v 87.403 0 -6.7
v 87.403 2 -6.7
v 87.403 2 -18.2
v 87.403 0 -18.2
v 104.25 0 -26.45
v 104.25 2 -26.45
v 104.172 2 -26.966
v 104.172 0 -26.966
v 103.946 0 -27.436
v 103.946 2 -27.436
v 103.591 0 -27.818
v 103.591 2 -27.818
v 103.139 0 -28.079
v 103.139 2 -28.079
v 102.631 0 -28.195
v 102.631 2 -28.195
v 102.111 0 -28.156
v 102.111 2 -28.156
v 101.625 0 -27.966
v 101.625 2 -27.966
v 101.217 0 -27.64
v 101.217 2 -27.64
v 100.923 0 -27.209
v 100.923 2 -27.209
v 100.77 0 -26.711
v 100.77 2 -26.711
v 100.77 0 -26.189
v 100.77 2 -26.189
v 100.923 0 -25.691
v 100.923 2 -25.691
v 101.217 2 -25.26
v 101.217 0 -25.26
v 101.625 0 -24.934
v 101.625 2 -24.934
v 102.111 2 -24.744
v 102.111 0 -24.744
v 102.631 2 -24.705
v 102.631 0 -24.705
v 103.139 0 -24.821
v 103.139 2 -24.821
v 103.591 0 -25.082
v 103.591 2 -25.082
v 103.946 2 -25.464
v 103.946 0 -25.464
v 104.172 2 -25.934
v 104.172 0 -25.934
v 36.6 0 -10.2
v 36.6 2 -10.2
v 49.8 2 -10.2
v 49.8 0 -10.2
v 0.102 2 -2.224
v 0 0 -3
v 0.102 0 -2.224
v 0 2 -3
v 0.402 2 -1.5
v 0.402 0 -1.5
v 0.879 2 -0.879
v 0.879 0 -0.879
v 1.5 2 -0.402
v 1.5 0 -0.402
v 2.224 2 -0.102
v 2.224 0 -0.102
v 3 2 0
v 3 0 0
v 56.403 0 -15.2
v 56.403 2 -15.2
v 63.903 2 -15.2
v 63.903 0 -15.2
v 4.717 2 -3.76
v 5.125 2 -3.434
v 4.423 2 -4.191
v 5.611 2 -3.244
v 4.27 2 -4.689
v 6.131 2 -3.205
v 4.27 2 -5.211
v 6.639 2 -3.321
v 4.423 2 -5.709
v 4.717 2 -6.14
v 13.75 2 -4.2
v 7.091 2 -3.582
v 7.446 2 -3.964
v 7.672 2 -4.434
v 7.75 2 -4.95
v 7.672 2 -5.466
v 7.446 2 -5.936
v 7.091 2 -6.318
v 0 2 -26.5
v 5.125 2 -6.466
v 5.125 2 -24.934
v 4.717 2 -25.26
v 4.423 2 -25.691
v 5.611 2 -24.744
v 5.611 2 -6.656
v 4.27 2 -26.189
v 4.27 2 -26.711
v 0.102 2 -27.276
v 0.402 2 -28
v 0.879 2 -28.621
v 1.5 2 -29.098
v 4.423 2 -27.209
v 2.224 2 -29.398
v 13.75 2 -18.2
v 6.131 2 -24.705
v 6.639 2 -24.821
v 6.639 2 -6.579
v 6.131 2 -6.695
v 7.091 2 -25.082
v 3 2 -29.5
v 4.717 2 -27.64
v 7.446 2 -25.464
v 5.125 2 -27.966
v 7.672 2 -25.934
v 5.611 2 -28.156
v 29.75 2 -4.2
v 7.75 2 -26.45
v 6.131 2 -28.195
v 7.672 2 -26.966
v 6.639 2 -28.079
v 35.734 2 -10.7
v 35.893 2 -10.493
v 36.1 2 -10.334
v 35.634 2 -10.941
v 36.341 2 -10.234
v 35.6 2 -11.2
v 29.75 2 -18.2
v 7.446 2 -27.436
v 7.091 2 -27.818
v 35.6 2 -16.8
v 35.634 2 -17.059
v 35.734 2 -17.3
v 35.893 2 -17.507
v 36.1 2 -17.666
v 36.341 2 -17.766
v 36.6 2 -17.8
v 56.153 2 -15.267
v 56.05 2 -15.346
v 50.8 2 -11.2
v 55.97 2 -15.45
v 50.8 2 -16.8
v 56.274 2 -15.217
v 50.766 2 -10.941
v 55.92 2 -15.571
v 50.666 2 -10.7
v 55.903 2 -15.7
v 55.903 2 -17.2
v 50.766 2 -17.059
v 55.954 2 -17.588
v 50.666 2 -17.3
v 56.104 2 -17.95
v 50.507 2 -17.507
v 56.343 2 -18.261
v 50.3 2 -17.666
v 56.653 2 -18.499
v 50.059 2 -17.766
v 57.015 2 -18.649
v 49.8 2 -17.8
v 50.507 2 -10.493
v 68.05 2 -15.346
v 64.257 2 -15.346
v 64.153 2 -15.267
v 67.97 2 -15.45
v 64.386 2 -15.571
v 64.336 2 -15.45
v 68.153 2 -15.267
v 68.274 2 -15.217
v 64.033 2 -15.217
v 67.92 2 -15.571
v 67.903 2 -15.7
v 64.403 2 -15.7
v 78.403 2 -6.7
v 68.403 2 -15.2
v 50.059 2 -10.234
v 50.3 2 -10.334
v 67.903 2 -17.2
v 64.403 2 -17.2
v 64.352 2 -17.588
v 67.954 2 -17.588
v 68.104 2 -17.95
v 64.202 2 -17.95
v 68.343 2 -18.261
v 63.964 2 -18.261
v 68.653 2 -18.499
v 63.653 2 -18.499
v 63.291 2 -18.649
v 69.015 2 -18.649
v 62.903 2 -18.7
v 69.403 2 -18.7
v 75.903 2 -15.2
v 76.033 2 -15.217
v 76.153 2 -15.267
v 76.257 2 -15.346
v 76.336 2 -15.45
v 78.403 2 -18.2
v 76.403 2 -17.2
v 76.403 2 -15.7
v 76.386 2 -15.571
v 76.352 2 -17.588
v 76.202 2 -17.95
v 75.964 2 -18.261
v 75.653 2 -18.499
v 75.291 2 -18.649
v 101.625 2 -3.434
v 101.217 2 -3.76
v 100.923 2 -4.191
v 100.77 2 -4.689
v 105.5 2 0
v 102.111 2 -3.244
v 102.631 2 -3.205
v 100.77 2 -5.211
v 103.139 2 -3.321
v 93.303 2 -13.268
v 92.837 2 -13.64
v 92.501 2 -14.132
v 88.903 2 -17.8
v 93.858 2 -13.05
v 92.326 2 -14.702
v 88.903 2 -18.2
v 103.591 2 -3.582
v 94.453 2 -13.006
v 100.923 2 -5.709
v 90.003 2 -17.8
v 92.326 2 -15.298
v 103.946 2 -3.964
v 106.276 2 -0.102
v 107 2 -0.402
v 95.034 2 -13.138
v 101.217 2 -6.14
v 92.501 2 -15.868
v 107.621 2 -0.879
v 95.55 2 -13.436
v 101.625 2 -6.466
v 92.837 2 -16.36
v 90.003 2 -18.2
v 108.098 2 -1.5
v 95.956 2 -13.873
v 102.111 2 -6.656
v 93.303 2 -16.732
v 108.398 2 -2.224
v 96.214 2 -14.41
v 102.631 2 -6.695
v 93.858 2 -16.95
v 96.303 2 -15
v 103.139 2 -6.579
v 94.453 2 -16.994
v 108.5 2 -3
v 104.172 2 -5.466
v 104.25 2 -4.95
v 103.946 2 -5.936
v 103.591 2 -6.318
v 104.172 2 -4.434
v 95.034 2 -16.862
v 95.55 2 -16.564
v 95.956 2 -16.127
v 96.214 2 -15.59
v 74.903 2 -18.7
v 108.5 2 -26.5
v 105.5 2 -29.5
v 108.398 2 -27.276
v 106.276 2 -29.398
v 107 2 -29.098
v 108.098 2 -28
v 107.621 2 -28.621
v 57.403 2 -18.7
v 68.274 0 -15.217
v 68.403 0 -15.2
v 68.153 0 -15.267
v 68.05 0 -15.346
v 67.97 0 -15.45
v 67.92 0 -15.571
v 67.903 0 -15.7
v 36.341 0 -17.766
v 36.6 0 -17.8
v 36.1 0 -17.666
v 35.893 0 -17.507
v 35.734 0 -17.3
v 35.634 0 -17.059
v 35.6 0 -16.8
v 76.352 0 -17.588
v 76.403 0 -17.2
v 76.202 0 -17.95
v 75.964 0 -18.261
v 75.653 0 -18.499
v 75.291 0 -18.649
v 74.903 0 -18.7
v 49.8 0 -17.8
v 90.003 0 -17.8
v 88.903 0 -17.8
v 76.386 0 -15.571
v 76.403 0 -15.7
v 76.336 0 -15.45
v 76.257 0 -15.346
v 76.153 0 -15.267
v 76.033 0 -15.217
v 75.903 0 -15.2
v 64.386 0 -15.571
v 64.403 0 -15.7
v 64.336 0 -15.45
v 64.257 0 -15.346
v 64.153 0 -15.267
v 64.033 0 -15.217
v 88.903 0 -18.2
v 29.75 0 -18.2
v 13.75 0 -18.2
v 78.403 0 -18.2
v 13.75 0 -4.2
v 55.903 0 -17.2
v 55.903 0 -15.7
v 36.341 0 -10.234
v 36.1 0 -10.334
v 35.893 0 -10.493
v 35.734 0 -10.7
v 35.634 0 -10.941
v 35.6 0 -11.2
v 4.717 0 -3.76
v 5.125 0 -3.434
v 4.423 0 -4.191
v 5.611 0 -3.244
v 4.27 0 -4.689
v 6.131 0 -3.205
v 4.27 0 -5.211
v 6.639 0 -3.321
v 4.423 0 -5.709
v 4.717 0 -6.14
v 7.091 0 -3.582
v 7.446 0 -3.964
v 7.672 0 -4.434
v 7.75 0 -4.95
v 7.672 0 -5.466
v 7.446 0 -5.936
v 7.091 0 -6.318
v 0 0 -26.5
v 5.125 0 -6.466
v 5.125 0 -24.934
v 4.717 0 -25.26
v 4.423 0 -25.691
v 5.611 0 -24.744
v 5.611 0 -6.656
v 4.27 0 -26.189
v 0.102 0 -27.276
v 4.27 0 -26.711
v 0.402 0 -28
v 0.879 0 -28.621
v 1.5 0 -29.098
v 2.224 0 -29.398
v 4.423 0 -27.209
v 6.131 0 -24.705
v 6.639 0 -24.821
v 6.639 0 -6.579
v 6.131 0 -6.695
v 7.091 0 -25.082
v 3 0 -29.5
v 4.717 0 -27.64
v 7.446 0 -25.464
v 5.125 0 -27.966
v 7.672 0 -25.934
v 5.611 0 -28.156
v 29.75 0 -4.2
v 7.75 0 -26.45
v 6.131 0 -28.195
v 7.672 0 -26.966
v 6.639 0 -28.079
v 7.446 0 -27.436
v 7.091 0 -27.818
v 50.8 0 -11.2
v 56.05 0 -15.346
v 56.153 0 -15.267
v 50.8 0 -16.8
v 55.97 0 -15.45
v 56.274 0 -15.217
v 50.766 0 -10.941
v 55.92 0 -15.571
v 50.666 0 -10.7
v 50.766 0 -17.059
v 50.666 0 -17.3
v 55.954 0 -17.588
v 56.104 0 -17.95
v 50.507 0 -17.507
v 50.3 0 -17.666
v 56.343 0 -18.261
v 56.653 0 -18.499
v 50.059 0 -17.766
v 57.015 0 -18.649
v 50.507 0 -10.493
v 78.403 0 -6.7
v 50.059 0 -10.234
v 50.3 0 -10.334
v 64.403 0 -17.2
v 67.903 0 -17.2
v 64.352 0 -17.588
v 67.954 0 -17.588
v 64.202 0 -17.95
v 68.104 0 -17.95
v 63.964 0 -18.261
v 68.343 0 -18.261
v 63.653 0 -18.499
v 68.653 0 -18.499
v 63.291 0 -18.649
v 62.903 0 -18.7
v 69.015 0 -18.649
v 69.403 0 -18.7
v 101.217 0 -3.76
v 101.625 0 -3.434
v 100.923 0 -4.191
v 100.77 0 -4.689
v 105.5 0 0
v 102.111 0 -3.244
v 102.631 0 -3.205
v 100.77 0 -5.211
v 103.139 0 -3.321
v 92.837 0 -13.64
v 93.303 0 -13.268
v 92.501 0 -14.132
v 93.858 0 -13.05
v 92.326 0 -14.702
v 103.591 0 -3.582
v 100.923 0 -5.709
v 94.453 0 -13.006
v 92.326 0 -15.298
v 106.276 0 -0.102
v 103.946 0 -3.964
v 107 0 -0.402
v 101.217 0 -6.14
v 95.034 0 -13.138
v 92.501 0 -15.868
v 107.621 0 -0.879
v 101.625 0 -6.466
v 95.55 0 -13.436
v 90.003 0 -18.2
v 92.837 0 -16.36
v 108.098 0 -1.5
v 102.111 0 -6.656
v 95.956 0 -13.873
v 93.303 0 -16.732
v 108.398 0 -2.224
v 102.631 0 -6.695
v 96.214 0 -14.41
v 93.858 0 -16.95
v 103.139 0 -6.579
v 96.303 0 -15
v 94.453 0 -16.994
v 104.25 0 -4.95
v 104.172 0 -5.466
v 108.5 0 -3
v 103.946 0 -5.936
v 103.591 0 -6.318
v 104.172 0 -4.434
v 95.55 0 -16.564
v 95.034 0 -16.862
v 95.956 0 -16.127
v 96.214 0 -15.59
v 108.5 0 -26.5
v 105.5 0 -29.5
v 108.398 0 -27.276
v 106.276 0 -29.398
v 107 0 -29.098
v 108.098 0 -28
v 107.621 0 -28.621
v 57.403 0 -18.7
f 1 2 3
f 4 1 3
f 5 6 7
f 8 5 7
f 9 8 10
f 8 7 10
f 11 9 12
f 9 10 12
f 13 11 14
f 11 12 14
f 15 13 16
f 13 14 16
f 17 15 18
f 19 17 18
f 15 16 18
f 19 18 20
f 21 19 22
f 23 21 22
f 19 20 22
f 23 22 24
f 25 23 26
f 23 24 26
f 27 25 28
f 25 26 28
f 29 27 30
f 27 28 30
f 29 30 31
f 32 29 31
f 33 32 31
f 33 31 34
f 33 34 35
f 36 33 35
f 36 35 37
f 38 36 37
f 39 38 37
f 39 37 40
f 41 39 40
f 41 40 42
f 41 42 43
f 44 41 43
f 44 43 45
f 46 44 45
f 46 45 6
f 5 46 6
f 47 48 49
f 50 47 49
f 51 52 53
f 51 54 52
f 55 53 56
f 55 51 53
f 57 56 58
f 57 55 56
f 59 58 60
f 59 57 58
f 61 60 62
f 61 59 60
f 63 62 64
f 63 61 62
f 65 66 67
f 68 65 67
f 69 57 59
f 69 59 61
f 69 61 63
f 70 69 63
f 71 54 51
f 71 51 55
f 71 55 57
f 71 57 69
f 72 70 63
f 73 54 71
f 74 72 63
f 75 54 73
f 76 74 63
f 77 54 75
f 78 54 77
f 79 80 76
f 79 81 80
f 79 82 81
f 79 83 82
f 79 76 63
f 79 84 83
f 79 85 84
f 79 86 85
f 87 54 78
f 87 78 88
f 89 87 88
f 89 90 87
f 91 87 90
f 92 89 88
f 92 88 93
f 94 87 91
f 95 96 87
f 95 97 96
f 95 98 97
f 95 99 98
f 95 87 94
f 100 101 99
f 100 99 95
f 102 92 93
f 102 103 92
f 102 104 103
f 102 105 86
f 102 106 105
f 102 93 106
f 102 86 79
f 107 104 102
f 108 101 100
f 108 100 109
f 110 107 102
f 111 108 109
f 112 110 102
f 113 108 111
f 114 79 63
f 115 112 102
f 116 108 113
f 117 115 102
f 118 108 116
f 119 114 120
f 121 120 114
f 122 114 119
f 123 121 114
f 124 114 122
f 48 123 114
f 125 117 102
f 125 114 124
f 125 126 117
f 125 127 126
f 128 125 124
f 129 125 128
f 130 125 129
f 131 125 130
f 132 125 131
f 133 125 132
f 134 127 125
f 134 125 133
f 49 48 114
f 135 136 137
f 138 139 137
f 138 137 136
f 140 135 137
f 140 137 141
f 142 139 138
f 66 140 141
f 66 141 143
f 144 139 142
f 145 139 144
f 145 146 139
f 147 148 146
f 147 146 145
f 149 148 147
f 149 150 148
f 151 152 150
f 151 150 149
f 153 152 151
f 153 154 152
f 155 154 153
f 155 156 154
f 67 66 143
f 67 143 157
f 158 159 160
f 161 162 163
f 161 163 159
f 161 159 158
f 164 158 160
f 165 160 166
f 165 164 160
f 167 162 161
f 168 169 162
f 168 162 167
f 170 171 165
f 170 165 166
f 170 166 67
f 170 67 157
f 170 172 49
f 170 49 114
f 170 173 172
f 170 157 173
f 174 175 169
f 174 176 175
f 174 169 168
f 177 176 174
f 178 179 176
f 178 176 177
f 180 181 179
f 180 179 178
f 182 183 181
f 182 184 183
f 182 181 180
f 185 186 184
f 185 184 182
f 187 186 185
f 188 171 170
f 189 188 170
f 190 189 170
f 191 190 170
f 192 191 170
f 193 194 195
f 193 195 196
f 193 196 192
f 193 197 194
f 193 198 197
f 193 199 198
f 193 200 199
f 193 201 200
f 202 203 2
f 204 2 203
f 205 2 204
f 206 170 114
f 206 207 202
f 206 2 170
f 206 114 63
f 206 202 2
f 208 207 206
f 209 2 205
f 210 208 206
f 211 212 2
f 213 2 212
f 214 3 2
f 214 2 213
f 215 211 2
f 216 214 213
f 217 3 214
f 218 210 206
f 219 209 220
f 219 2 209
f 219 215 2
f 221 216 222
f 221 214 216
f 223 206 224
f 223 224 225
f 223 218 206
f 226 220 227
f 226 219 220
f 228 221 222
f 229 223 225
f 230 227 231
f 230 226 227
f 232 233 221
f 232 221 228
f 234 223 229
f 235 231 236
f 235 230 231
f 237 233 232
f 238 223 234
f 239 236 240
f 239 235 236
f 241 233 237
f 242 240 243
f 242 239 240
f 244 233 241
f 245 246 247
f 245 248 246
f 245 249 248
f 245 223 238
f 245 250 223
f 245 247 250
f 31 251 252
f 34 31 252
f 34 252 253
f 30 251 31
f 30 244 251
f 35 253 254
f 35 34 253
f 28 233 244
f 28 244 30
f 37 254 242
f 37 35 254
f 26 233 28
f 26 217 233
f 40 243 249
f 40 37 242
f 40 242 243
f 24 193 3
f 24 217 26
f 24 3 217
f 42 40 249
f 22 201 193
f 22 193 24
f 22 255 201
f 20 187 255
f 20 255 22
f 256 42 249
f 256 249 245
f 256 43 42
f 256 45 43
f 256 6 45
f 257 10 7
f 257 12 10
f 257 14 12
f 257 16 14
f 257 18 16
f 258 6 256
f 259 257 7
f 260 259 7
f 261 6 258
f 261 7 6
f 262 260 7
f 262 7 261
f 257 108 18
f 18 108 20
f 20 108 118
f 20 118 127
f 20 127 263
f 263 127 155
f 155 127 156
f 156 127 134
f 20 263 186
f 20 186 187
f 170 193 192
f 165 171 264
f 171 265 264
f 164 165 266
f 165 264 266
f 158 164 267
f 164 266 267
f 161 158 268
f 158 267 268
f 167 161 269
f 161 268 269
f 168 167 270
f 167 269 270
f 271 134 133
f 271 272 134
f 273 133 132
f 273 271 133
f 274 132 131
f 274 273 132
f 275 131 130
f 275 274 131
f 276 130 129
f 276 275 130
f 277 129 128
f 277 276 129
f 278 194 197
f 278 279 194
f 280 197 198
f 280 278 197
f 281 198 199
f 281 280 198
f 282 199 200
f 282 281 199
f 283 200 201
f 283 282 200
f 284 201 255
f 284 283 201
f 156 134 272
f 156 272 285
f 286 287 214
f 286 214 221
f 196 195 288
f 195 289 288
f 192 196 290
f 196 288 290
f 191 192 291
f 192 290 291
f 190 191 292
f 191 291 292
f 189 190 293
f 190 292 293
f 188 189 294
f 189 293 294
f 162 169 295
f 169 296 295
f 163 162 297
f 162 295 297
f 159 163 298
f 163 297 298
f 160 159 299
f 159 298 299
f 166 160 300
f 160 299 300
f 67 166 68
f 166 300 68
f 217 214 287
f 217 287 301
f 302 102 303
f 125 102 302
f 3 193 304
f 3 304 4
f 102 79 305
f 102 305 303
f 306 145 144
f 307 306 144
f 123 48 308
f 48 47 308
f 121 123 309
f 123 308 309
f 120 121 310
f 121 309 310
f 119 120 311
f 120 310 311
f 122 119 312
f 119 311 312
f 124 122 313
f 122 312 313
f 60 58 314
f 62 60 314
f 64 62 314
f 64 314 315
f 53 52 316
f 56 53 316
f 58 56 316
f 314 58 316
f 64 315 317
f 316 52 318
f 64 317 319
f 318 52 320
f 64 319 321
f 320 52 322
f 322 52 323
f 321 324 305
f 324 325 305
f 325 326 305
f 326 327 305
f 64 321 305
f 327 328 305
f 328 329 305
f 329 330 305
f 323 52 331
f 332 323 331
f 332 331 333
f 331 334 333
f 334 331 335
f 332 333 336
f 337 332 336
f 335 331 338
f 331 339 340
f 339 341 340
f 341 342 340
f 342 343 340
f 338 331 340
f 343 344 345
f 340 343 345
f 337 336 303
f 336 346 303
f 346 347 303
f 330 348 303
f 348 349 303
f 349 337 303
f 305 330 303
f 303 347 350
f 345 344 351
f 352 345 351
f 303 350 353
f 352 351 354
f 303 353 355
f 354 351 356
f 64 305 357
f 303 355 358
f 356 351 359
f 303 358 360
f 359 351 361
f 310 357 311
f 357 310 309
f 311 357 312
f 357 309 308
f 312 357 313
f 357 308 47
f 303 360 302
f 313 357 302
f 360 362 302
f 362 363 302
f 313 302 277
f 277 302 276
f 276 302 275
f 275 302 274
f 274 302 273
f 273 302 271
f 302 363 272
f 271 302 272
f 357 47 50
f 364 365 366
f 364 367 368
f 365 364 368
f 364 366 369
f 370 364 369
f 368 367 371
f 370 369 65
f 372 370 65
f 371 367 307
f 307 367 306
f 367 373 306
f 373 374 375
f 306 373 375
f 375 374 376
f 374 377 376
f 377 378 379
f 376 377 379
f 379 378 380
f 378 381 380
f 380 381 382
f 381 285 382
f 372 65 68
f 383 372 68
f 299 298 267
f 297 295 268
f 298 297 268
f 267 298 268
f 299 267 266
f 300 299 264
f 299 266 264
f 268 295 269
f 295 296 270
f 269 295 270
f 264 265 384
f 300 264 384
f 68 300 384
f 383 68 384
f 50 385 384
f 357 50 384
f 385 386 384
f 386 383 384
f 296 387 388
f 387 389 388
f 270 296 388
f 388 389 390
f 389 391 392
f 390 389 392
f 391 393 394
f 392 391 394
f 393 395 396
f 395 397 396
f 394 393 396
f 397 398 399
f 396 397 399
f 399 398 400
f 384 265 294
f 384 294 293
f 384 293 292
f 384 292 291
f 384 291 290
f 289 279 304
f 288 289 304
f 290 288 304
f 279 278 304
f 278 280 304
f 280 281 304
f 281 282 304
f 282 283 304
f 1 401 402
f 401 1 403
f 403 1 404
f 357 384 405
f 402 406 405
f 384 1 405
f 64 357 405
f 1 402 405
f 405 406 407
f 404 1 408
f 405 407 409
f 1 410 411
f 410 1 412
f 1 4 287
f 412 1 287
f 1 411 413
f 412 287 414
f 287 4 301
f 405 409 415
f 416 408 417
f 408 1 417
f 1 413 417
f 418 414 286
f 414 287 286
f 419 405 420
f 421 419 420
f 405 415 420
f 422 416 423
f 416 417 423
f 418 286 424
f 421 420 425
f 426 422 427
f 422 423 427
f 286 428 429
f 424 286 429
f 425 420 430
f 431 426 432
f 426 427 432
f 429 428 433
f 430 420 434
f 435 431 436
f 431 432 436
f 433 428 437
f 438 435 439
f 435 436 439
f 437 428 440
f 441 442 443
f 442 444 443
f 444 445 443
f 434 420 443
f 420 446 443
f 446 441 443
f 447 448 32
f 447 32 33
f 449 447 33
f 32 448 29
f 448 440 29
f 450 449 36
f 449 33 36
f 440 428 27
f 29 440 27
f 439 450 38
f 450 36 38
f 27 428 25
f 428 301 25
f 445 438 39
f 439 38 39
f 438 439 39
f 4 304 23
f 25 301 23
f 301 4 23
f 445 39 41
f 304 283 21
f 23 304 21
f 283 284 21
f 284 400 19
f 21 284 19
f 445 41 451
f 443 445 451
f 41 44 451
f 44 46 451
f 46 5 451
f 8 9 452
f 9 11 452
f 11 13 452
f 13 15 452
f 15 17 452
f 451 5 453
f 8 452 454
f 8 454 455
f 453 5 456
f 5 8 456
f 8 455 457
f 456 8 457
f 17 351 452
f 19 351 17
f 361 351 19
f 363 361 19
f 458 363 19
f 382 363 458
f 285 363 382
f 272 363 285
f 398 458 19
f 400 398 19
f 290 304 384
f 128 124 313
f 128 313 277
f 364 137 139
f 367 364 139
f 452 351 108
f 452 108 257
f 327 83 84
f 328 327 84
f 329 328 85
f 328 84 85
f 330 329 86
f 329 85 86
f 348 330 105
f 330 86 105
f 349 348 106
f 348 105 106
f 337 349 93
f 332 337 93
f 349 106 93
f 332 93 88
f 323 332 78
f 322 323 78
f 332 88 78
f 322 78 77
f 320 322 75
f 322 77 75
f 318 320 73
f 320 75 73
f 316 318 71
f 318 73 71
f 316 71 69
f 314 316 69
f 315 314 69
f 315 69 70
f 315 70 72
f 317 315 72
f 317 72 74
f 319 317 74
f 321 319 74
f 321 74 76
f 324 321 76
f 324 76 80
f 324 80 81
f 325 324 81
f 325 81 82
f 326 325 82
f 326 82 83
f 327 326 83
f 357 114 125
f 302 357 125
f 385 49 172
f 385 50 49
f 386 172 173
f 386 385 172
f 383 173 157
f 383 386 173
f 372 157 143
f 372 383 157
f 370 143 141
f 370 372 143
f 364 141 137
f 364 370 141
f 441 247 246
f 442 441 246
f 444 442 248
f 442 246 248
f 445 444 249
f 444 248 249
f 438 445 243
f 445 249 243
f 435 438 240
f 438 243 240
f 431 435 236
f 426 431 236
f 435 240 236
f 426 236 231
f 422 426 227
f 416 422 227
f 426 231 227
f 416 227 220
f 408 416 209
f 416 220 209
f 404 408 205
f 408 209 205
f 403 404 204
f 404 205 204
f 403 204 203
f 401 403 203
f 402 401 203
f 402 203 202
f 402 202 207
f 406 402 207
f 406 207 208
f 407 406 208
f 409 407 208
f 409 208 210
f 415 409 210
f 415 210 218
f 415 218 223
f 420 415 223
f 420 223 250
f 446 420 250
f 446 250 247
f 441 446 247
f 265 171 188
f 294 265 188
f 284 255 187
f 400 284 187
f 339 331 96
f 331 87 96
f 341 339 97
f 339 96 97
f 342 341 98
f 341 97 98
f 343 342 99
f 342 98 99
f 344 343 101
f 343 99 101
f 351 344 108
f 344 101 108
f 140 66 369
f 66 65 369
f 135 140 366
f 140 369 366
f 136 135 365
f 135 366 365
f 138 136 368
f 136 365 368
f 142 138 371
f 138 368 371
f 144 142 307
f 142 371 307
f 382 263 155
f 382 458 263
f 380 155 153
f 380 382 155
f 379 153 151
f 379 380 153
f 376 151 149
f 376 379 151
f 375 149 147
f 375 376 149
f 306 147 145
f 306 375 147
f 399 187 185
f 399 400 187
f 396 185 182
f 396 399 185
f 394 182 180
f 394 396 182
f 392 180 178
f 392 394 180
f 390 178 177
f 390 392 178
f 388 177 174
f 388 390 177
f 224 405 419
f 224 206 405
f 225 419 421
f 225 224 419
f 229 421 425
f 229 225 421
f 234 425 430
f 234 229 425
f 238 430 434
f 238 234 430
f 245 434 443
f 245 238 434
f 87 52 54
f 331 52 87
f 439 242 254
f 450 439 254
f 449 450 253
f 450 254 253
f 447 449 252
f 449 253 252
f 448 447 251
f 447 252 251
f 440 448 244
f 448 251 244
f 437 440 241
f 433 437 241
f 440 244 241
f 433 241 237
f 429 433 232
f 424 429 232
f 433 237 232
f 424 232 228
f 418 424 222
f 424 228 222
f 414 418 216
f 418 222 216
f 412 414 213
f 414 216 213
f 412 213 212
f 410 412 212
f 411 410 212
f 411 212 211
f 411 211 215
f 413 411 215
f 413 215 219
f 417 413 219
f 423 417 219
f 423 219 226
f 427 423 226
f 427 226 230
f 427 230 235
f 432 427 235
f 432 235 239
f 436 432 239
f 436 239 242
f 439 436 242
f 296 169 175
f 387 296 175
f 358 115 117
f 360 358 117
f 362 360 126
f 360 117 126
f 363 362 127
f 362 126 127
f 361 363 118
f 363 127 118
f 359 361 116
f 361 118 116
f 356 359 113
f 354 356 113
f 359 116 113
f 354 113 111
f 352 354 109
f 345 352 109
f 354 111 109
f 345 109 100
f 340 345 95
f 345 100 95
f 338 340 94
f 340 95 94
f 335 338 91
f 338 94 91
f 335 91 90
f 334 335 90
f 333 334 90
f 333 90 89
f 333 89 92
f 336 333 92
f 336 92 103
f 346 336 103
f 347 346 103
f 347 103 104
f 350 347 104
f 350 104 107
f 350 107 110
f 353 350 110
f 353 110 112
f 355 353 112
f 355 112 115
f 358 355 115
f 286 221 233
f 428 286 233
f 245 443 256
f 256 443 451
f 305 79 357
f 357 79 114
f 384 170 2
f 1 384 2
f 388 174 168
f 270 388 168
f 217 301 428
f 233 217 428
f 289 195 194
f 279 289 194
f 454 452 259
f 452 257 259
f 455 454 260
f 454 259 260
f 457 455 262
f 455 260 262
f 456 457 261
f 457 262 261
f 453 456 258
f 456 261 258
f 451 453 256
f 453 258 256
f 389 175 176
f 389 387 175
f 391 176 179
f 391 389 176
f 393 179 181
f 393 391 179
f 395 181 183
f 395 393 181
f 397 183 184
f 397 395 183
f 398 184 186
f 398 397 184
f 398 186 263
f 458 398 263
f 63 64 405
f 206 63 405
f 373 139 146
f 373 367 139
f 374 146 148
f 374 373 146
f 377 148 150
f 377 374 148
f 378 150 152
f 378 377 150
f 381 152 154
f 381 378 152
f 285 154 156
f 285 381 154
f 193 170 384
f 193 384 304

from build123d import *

# Parameters (mm, degrees)
SKETCH1_W           = 108.5
SKETCH1_H           = 29.5
BOSS_EXTRUDE1_DEPTH = 2
SKETCH2_R           = 1.75
CUT_EXTRUDE1_DEPTH  = 3
FILLET1_R           = 3
SKETCH5_R           = 2
SKETCH5_W           = 16
SKETCH5_H           = 14
SKETCH5_W_2         = 15.2
SKETCH5_H_2         = 7.6
SKETCH5_W_3         = 1.1
SKETCH5_H_3         = 0.4
SKETCH5_W_4         = 9
SKETCH5_H_4         = 11.5
CUT_EXTRUDE2_DEPTH  = 3
FILLET2_R           = 1
FILLET3_R           = 1.5
FILLET4_R           = 0.5


with BuildPart() as part:
    # Sketch1 → Boss-Extrude1 (new body)
    with BuildSketch(Plane(origin=(0, 0, 0), x_dir=(1, 0, 0), z_dir=(0, 1, 0))):
        with Locations((54.25, 14.75)):
            Rectangle(SKETCH1_W, SKETCH1_H)
    extrude(amount=BOSS_EXTRUDE1_DEPTH)

    # Sketch2 → Cut-Extrude1 (cut, through all)
    with BuildSketch(Plane(origin=(0, 2, 0), x_dir=(1, 0, 0), z_dir=(0, 1, 0))):
        with Locations((6, 26.45)):
            Circle(SKETCH2_R)
        with Locations((6, 4.95)):
            Circle(SKETCH2_R)
        with Locations((102.5, 4.95)):
            Circle(SKETCH2_R)
        with Locations((102.5, 26.45)):
            Circle(SKETCH2_R)
    extrude(amount=-CUT_EXTRUDE1_DEPTH, mode=Mode.SUBTRACT)

    # Fillet1
    fillet1_edges = [part.edges().sort_by_distance(p)[0] for p in [
        (0, 1, -29.5),
        (108.5, 1, -29.5),
        (108.5, 1, 0),
        (0, 1, 0),
    ]]
    fillet(fillet1_edges, radius=FILLET1_R)

    # Sketch5 → Cut-Extrude2 (cut, through all)
    with BuildSketch(Plane(origin=(0, 2, 0), x_dir=(1, 0, 0), z_dir=(0, 1, 0))):
        with Locations((94.303253972, 15)):
            Circle(SKETCH5_R)
        with Locations((21.75, 11.2)):
            Rectangle(SKETCH5_W, SKETCH5_H)
        with Locations((43.2, 14)):
            Rectangle(SKETCH5_W_2, SKETCH5_H_2)
        Polygon((55.903253972, 18.2), (55.903253972, 15.2), (64.403253972, 15.2), (64.403253972, 18.2), (64.403253972, 18.7), (55.903253972, 18.7), align=None)
        with Locations((89.453253972, 18)):
            Rectangle(SKETCH5_W_3, SKETCH5_H_3)
        Polygon((67.903253972, 18.2), (67.903253972, 15.2), (76.403253972, 15.2), (76.403253972, 18.2), (76.403253972, 18.7), (67.903253972, 18.7), align=None)
        with Locations((82.903253972, 12.45)):
            Rectangle(SKETCH5_W_4, SKETCH5_H_4)
    extrude(amount=-CUT_EXTRUDE2_DEPTH, mode=Mode.SUBTRACT)

    # Fillet2
    fillet2_edges = [part.edges().sort_by_distance(p)[0] for p in [
        (50.8, 1, -10.2),
        (35.6, 1, -10.2),
        (35.6, 1, -17.8),
        (50.8, 1, -17.8),
    ]]
    fillet(fillet2_edges, radius=FILLET2_R)

    # Fillet3
    fillet3_edges = [part.edges().sort_by_distance(p)[0] for p in [
        (67.903253972, 1, -18.7),
        (76.403253972, 1, -18.7),
        (55.903253972, 1, -18.7),
        (64.403253972, 1, -18.7),
    ]]
    fillet(fillet3_edges, radius=FILLET3_R)

    # Fillet4
    fillet4_edges = [part.edges().sort_by_distance(p)[0] for p in [
        (76.403253972, 1, -15.2),
        (67.903253972, 1, -15.2),
        (64.403253972, 1, -15.2),
        (55.903253972, 1, -15.2),
    ]]
    fillet(fillet4_edges, radius=FILLET4_R)


solid = part.part
